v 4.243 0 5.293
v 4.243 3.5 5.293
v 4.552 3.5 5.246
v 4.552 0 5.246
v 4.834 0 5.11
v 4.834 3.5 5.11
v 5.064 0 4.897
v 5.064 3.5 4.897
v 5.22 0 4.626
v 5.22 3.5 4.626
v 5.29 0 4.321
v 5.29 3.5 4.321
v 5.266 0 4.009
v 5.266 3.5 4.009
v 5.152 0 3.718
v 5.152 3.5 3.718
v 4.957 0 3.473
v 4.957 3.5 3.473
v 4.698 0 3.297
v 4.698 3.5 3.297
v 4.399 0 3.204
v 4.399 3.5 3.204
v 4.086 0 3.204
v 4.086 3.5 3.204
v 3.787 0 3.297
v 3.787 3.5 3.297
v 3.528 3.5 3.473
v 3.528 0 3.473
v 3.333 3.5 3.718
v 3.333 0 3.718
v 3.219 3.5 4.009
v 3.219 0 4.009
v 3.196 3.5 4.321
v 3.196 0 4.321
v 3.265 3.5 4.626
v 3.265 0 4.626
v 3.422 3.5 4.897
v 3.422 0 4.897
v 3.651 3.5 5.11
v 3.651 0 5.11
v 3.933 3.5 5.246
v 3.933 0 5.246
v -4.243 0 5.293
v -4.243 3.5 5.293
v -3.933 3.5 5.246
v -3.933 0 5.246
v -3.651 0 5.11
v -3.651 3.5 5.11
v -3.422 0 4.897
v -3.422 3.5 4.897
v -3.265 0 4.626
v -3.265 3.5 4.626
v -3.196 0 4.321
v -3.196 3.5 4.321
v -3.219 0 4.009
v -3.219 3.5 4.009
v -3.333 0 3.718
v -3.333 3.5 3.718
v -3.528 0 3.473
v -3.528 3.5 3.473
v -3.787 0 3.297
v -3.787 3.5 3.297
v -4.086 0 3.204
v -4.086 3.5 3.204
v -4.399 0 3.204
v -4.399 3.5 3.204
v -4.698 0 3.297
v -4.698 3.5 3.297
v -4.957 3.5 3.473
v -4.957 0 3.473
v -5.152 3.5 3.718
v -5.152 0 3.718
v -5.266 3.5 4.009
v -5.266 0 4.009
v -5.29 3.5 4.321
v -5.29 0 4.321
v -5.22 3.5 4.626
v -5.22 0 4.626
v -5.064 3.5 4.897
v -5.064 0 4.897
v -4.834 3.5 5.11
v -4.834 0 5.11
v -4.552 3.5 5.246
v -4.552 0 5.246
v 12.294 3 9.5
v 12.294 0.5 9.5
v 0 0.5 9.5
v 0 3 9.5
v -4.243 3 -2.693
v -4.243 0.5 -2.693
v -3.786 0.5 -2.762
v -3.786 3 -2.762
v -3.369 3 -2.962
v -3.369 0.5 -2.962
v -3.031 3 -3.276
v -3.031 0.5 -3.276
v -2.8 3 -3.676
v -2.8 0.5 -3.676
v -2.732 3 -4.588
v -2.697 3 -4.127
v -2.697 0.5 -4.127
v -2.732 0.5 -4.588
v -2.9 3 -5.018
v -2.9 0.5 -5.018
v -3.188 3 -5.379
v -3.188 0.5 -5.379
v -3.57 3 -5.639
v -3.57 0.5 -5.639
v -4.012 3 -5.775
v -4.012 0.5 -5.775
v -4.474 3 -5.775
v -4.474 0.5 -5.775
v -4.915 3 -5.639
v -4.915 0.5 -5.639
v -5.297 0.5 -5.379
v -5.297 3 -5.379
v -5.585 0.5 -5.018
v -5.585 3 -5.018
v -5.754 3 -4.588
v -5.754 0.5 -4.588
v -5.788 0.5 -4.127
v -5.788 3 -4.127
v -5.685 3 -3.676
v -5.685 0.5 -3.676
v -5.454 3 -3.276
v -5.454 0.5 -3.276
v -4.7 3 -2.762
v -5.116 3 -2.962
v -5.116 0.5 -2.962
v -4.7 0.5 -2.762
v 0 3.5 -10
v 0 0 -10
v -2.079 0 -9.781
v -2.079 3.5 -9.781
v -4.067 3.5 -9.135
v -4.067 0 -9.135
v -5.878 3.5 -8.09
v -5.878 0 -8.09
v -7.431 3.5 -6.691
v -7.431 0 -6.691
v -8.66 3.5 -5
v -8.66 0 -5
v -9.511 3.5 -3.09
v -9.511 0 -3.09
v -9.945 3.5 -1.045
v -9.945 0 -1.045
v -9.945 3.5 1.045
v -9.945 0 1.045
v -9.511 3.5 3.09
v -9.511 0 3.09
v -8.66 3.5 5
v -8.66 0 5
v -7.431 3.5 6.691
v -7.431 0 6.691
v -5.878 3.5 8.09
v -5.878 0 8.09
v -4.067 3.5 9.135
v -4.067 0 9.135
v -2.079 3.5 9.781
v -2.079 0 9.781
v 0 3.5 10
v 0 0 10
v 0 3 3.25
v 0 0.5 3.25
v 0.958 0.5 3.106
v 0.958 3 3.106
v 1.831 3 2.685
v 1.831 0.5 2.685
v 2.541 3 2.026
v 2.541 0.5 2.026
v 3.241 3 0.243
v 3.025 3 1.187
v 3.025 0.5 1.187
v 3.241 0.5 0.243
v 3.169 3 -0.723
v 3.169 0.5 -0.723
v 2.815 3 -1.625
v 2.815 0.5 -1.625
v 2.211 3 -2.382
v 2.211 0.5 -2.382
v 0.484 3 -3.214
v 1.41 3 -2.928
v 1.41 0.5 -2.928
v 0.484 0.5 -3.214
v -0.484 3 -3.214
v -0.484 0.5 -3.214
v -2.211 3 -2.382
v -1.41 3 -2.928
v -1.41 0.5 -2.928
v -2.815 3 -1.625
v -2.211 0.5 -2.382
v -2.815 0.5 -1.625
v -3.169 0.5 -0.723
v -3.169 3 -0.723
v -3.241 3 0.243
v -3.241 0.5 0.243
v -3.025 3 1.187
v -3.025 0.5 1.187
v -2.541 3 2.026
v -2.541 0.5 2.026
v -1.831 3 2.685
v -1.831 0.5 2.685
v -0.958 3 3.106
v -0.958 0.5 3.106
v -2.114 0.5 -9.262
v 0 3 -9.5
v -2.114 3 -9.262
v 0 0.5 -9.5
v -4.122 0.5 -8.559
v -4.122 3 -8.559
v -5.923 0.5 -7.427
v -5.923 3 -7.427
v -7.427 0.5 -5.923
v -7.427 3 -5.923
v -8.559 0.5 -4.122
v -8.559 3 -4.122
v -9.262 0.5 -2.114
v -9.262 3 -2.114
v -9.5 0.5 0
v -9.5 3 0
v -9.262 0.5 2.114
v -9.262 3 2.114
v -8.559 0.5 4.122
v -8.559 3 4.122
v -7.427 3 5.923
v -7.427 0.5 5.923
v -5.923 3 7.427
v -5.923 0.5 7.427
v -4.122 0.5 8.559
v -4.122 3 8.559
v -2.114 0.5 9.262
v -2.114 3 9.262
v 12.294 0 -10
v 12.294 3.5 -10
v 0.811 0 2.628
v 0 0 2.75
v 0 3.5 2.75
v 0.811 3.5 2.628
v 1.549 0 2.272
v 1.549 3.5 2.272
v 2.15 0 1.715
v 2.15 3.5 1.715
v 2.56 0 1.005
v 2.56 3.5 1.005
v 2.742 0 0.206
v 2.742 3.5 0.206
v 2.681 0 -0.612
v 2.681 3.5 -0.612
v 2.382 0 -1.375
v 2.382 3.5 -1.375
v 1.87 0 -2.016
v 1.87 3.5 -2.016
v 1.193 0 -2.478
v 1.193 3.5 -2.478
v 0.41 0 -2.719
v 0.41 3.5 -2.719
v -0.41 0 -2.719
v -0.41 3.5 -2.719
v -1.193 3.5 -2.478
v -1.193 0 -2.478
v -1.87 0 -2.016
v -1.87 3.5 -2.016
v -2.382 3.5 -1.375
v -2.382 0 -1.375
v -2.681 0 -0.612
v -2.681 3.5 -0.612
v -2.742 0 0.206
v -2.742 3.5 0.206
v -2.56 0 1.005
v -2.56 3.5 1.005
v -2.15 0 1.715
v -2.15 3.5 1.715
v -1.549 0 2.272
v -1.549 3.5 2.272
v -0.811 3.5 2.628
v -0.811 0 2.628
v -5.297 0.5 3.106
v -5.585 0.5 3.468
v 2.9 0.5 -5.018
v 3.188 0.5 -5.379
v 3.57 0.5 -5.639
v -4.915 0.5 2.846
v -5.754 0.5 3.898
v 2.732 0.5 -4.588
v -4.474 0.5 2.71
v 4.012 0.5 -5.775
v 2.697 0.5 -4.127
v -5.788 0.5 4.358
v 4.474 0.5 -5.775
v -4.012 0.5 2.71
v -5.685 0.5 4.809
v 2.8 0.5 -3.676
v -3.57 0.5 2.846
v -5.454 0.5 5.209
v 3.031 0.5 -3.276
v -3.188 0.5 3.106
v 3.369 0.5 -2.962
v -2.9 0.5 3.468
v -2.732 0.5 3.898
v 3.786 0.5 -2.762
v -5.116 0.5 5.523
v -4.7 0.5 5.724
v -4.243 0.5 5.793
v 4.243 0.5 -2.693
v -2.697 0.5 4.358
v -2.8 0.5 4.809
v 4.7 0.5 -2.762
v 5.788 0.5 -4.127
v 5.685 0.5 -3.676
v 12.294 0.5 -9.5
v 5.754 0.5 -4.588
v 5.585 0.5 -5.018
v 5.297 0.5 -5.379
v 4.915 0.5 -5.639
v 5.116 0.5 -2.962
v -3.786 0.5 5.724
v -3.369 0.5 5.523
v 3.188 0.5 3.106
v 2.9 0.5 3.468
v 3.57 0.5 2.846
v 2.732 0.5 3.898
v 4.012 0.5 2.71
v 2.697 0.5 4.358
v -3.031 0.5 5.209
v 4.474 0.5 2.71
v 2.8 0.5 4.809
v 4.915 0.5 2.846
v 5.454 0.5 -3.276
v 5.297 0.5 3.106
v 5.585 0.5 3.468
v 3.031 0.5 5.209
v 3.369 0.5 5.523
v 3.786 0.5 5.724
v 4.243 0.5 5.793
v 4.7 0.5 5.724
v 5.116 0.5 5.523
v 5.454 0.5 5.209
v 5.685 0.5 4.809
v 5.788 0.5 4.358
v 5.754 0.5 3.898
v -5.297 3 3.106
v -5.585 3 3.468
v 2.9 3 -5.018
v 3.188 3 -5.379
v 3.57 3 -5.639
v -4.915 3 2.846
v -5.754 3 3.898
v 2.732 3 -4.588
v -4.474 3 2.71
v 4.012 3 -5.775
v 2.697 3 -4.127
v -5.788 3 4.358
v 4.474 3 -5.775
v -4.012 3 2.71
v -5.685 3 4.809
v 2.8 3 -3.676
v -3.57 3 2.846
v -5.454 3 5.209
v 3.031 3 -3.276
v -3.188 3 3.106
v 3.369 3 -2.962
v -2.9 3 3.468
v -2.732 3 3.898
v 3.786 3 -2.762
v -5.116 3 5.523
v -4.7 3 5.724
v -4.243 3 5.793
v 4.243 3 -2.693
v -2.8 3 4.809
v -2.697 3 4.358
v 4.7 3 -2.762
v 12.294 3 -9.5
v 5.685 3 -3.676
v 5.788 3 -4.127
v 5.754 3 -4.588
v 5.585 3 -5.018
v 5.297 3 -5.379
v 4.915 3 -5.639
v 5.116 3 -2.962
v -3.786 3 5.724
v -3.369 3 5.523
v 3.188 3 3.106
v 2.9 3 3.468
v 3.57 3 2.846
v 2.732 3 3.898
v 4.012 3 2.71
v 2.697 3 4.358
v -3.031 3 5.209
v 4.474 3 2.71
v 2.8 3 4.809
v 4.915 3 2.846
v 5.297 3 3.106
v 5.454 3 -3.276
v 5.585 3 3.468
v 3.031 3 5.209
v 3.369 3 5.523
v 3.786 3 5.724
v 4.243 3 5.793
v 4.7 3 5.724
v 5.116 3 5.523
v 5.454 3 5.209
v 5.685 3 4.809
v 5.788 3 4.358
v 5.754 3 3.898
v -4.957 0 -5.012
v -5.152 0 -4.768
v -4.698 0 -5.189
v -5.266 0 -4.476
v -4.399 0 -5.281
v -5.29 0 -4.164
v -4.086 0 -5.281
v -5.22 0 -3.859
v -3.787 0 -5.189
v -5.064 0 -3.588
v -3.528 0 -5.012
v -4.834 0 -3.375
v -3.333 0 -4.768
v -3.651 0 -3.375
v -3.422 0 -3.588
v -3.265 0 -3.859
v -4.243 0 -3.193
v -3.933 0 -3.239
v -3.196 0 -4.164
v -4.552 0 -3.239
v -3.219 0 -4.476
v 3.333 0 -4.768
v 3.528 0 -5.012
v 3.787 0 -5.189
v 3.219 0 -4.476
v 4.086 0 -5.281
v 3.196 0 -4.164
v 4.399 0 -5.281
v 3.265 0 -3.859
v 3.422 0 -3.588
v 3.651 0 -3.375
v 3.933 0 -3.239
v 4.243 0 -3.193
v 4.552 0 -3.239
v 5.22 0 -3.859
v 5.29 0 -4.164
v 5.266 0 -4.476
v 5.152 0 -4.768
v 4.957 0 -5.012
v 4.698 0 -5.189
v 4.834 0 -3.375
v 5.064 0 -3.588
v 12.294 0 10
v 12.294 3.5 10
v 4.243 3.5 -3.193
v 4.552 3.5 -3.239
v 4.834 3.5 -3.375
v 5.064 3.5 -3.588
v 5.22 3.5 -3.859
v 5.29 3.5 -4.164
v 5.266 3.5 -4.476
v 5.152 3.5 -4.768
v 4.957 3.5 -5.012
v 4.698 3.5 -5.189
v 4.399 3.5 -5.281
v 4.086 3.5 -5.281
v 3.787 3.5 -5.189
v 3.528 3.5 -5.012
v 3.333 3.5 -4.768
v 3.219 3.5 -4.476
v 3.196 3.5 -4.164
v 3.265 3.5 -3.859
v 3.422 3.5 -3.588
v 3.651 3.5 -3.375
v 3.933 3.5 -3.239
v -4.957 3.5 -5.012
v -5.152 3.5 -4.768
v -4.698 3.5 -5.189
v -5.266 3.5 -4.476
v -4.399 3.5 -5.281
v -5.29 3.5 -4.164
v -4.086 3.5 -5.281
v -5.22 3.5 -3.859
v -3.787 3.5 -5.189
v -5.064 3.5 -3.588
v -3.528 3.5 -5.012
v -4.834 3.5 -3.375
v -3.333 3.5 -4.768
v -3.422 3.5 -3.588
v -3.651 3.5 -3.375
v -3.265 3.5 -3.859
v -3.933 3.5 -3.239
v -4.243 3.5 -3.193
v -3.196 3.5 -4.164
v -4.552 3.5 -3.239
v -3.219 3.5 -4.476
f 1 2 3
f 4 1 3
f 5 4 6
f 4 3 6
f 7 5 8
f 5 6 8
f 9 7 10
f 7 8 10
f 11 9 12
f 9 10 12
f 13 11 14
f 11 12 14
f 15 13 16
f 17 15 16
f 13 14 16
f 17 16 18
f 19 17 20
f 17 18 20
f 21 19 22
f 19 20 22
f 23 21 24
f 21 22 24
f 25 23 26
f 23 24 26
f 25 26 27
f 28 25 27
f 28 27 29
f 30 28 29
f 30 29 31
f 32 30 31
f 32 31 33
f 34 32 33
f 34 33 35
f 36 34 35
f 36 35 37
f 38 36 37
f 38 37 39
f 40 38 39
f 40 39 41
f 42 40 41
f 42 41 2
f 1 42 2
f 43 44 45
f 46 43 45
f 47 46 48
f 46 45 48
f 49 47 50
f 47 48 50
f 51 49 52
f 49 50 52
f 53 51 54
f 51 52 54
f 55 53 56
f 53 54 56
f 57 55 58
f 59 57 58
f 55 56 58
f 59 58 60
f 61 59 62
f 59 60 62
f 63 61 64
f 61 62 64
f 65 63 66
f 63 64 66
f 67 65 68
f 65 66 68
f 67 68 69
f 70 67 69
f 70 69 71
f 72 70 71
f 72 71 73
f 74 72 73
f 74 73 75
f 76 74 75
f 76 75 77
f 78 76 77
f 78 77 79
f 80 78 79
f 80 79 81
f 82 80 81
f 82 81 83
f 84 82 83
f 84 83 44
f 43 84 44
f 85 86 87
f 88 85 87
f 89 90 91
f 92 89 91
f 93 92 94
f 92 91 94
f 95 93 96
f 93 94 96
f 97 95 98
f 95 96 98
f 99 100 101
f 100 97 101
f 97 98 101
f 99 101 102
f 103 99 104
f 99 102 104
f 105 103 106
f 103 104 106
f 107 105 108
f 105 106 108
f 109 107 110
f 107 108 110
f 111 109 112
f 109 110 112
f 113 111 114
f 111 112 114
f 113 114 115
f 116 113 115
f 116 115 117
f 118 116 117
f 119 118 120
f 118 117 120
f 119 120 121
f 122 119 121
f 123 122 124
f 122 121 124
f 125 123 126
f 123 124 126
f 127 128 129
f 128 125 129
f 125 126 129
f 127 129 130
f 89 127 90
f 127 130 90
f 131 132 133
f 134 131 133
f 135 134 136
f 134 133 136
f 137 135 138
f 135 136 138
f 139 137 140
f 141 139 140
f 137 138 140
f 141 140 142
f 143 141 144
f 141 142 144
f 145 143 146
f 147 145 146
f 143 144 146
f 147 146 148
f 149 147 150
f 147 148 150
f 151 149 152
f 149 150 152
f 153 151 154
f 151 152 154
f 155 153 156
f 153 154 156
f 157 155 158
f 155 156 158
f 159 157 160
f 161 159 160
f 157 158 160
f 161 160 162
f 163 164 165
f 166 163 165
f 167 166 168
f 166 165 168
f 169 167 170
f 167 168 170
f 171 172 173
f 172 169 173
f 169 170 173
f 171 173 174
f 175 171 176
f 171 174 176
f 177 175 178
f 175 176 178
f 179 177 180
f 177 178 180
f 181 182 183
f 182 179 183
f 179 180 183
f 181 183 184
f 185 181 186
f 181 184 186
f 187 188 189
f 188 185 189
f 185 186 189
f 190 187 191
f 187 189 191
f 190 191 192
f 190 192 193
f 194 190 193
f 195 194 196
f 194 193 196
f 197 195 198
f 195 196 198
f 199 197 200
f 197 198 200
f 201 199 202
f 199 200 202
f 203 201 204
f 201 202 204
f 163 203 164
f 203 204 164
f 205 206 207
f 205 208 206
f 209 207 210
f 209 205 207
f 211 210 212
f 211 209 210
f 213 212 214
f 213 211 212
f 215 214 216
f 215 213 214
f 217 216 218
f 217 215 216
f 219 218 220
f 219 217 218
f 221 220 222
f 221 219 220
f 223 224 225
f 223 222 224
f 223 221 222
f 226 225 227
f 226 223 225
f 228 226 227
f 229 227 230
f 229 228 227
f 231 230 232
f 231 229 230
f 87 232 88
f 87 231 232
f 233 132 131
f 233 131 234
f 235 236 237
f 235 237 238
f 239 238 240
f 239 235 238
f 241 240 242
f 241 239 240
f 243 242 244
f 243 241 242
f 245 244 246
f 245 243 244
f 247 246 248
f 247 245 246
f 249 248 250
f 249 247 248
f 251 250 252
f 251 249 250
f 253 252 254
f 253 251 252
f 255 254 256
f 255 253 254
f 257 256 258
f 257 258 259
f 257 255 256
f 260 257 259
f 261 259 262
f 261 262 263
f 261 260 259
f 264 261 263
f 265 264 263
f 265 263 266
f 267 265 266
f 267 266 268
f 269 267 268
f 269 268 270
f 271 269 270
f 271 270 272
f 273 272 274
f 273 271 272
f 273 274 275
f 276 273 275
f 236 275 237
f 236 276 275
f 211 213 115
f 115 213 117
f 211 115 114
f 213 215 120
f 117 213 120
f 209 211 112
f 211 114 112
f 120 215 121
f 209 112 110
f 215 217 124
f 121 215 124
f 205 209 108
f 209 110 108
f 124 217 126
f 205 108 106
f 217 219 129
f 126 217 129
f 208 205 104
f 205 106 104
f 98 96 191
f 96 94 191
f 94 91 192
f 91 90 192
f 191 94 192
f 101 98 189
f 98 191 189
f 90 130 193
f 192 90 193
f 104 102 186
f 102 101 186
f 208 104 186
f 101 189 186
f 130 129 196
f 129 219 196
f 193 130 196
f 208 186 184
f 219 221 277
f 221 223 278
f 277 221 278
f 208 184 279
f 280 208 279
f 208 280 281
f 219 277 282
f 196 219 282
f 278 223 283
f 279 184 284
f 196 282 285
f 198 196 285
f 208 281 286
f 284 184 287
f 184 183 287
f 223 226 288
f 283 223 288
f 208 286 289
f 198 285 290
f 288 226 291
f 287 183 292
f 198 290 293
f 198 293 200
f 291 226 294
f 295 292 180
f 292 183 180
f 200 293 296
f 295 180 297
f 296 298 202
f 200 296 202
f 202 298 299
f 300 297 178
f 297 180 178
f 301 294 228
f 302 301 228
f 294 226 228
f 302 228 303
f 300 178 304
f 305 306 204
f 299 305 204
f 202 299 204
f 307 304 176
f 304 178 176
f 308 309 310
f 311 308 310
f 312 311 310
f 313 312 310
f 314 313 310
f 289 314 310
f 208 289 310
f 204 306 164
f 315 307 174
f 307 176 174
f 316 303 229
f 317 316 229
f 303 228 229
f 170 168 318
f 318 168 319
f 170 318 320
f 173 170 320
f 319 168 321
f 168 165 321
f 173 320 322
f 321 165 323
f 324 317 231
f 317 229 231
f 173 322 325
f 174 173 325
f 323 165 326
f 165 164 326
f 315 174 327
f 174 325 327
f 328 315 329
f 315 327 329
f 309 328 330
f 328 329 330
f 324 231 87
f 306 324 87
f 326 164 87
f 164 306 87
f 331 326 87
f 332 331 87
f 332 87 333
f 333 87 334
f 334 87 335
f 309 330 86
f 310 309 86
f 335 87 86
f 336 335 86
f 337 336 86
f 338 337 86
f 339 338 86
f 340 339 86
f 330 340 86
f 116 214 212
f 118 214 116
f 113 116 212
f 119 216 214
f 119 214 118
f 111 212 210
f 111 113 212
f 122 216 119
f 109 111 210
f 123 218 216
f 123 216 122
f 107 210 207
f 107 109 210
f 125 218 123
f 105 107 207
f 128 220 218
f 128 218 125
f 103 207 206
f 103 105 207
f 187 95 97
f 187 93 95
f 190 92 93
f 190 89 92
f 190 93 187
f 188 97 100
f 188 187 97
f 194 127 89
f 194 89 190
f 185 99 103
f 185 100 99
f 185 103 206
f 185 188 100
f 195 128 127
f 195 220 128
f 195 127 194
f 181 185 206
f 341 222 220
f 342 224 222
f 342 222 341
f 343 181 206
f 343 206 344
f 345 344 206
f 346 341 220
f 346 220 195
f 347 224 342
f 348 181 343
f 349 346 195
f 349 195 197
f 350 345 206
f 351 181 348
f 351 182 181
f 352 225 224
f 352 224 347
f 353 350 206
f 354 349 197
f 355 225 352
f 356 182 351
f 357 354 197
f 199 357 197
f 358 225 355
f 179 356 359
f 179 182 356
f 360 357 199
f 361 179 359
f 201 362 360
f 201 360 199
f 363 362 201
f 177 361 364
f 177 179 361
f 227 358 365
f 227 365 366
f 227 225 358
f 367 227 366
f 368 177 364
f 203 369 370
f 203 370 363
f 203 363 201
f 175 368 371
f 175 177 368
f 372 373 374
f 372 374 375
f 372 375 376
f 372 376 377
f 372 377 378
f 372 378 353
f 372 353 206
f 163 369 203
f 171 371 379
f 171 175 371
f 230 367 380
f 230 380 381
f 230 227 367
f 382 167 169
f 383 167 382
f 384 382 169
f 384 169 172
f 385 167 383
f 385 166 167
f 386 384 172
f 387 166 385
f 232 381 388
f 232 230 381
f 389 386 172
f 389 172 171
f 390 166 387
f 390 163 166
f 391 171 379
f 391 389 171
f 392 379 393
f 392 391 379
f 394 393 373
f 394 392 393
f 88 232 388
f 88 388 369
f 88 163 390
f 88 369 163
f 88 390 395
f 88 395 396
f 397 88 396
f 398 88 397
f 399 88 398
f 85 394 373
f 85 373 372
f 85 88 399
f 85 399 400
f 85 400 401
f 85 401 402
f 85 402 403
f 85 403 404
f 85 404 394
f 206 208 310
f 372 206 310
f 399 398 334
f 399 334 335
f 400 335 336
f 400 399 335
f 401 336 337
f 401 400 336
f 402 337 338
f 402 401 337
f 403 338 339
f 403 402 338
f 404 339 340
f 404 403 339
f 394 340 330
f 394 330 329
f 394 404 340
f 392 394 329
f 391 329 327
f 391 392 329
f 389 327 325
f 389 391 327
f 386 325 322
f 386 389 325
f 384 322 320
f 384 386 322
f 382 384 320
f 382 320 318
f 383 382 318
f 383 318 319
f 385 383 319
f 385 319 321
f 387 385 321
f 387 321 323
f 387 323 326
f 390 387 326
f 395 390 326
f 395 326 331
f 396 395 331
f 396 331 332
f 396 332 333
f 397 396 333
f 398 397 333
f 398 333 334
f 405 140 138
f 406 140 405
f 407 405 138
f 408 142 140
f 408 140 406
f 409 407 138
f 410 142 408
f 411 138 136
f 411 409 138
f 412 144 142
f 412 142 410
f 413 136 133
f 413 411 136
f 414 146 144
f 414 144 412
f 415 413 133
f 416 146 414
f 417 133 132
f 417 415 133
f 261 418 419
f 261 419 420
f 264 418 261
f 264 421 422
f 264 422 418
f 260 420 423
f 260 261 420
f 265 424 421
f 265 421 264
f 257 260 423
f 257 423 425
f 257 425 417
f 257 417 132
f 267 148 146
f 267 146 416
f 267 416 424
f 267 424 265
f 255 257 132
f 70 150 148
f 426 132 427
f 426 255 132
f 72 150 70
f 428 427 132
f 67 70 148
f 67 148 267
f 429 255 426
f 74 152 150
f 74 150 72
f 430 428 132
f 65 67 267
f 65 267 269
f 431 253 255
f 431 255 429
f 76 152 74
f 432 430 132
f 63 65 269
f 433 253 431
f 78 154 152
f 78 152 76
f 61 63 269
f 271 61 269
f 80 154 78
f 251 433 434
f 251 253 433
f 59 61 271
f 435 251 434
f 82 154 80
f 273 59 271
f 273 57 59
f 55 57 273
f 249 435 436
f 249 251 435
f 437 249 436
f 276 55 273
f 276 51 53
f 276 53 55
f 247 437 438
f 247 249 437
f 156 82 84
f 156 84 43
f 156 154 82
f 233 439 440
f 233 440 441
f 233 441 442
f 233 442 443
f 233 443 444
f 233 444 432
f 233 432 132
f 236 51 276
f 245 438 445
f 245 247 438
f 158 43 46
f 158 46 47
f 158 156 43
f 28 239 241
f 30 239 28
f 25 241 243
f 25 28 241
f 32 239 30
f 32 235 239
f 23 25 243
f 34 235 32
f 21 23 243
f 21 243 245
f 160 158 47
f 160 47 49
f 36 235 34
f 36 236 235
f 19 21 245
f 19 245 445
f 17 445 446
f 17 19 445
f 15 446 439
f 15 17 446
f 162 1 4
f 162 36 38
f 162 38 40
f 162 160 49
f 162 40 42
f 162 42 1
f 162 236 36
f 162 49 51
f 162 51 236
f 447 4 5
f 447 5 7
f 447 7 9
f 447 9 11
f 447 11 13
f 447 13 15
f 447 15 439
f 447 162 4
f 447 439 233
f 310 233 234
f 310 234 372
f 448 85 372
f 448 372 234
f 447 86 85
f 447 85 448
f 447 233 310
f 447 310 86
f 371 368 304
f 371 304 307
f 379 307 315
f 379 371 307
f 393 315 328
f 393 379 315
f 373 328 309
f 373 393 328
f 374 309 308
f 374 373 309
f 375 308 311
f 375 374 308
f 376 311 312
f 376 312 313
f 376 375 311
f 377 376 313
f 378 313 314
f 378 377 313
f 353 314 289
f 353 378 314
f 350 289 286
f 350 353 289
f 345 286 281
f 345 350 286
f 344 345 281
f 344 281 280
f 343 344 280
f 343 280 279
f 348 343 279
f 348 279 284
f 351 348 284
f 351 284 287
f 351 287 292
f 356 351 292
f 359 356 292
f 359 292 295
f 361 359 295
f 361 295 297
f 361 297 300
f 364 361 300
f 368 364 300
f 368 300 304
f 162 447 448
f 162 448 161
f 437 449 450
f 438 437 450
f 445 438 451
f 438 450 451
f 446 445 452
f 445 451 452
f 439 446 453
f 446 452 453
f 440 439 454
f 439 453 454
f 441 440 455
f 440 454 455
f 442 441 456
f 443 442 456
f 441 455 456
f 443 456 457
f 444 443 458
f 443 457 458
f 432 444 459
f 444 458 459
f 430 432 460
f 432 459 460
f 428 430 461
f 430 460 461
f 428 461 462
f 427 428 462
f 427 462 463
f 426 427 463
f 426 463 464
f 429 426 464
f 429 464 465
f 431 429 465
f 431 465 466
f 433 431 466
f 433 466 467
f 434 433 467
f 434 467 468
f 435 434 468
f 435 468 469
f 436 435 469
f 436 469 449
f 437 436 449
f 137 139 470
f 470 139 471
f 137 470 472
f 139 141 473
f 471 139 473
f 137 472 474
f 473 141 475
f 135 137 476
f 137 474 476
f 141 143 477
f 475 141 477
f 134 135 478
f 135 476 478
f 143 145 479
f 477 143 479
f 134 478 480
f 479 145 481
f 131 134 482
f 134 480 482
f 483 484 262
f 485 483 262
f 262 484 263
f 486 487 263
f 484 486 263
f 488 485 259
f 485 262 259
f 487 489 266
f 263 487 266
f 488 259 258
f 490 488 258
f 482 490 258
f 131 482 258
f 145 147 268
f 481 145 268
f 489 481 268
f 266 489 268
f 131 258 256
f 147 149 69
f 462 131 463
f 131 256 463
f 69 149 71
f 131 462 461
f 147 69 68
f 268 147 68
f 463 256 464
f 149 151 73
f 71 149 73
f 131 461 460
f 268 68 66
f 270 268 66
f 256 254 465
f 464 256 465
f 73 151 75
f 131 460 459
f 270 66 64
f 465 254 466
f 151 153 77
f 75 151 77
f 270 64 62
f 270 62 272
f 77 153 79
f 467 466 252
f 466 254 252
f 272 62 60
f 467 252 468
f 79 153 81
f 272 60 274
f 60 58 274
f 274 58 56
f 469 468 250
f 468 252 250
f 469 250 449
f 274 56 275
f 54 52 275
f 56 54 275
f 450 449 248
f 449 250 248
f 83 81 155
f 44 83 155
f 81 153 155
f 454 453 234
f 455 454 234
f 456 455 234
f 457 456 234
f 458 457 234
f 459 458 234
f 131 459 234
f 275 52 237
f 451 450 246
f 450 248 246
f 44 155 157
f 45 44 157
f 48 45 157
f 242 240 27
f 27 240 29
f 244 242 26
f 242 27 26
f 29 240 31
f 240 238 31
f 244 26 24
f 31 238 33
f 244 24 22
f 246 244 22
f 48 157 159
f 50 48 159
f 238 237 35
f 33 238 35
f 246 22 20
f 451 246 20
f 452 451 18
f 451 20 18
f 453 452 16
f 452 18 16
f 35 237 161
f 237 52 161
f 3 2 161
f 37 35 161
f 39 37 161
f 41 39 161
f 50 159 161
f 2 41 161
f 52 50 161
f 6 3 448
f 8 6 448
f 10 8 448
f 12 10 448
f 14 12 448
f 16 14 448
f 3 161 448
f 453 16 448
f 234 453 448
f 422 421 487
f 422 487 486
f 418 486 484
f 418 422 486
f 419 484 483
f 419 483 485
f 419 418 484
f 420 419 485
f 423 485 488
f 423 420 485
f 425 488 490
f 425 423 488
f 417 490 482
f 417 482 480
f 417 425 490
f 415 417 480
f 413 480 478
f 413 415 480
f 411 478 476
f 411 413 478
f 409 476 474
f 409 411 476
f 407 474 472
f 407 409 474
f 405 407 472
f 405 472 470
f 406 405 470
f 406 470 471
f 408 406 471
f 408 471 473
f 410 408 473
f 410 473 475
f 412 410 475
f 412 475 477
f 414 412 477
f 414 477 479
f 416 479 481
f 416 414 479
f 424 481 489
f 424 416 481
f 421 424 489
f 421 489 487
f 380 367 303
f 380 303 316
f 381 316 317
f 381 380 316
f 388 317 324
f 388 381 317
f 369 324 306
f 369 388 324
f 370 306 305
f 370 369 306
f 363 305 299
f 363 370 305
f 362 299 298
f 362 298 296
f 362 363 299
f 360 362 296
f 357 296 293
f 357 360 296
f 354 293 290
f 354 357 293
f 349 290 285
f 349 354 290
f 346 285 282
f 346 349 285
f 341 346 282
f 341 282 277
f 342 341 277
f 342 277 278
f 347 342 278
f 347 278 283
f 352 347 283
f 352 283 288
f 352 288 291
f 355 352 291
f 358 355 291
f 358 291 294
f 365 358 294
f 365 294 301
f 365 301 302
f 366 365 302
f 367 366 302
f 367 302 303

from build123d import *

# Parameters (mm, degrees)
SKETCH1_R           = 10
SKETCH1_R_2         = 1.05
SKETCH1_R_3         = 2.75
BOSS_EXTRUDE1_DEPTH = 3.5
SKETCH8_R           = 1.05
CUT_EXTRUDE2_DEPTH  = 10
BOSS_EXTRUDE5_DEPTH = 3.5
SHELL2_T            = -0.5


with BuildPart() as part:
    # Sketch1 → Boss-Extrude1 (new body)
    with BuildSketch(Plane(origin=(0, 0, 0), x_dir=(1, 0, 0), z_dir=(0, 1, 0))):
        with Locations(Location((0, 0, 0), (0, 0, 270))):
            Circle(SKETCH1_R)
        with Locations(Location((-4.24264069, 4.24264069, 0), (0, 0, 270))):
            Circle(SKETCH1_R_2, mode=Mode.SUBTRACT)
        with Locations(Location((0, 0, 0), (0, 0, 270))):
            Circle(SKETCH1_R_3, mode=Mode.SUBTRACT)
    extrude(amount=BOSS_EXTRUDE1_DEPTH)

    # Sketch8 → Cut-Extrude2 (cut)
    with BuildSketch(Plane(origin=(0, 3.5, 0), x_dir=(1, 0, 0), z_dir=(0, 1, 0))):
        with Locations(Location((-4.24264069, -4.24264069, 0), (0, 0, 270))):
            Circle(SKETCH8_R)
        with Locations(Location((4.24264069, 4.24264069, 0), (0, 0, 270))):
            Circle(SKETCH8_R)
        with Locations(Location((4.24264069, -4.24264069, 0), (0, 0, 270))):
            Circle(SKETCH8_R)
    extrude(amount=-CUT_EXTRUDE2_DEPTH, mode=Mode.SUBTRACT)

    # Sketch11 → Boss-Extrude5 (add)
    with BuildSketch(Plane.XZ):
        with BuildLine():
            Line((12.293904652, 10), (0, 10))
            ThreePointArc((0, 10), (7.071067812, 7.071067812), (10, 0))
            ThreePointArc((10, 0), (7.071067812, -7.071067812), (0, -10))
            Line((0, -10), (12.293904652, -10))
            Line((12.293904652, -10), (12.293904652, 10))
        make_face()
    extrude(amount=-BOSS_EXTRUDE5_DEPTH)

    # Shell2
    shell2_openings = [part.faces().sort_by_distance(p)[0] for p in [
        (12.293904652, 1.75, 0),
    ]]
    offset(amount=SHELL2_T, openings=shell2_openings, kind=Kind.INTERSECTION)


solid = part.part
